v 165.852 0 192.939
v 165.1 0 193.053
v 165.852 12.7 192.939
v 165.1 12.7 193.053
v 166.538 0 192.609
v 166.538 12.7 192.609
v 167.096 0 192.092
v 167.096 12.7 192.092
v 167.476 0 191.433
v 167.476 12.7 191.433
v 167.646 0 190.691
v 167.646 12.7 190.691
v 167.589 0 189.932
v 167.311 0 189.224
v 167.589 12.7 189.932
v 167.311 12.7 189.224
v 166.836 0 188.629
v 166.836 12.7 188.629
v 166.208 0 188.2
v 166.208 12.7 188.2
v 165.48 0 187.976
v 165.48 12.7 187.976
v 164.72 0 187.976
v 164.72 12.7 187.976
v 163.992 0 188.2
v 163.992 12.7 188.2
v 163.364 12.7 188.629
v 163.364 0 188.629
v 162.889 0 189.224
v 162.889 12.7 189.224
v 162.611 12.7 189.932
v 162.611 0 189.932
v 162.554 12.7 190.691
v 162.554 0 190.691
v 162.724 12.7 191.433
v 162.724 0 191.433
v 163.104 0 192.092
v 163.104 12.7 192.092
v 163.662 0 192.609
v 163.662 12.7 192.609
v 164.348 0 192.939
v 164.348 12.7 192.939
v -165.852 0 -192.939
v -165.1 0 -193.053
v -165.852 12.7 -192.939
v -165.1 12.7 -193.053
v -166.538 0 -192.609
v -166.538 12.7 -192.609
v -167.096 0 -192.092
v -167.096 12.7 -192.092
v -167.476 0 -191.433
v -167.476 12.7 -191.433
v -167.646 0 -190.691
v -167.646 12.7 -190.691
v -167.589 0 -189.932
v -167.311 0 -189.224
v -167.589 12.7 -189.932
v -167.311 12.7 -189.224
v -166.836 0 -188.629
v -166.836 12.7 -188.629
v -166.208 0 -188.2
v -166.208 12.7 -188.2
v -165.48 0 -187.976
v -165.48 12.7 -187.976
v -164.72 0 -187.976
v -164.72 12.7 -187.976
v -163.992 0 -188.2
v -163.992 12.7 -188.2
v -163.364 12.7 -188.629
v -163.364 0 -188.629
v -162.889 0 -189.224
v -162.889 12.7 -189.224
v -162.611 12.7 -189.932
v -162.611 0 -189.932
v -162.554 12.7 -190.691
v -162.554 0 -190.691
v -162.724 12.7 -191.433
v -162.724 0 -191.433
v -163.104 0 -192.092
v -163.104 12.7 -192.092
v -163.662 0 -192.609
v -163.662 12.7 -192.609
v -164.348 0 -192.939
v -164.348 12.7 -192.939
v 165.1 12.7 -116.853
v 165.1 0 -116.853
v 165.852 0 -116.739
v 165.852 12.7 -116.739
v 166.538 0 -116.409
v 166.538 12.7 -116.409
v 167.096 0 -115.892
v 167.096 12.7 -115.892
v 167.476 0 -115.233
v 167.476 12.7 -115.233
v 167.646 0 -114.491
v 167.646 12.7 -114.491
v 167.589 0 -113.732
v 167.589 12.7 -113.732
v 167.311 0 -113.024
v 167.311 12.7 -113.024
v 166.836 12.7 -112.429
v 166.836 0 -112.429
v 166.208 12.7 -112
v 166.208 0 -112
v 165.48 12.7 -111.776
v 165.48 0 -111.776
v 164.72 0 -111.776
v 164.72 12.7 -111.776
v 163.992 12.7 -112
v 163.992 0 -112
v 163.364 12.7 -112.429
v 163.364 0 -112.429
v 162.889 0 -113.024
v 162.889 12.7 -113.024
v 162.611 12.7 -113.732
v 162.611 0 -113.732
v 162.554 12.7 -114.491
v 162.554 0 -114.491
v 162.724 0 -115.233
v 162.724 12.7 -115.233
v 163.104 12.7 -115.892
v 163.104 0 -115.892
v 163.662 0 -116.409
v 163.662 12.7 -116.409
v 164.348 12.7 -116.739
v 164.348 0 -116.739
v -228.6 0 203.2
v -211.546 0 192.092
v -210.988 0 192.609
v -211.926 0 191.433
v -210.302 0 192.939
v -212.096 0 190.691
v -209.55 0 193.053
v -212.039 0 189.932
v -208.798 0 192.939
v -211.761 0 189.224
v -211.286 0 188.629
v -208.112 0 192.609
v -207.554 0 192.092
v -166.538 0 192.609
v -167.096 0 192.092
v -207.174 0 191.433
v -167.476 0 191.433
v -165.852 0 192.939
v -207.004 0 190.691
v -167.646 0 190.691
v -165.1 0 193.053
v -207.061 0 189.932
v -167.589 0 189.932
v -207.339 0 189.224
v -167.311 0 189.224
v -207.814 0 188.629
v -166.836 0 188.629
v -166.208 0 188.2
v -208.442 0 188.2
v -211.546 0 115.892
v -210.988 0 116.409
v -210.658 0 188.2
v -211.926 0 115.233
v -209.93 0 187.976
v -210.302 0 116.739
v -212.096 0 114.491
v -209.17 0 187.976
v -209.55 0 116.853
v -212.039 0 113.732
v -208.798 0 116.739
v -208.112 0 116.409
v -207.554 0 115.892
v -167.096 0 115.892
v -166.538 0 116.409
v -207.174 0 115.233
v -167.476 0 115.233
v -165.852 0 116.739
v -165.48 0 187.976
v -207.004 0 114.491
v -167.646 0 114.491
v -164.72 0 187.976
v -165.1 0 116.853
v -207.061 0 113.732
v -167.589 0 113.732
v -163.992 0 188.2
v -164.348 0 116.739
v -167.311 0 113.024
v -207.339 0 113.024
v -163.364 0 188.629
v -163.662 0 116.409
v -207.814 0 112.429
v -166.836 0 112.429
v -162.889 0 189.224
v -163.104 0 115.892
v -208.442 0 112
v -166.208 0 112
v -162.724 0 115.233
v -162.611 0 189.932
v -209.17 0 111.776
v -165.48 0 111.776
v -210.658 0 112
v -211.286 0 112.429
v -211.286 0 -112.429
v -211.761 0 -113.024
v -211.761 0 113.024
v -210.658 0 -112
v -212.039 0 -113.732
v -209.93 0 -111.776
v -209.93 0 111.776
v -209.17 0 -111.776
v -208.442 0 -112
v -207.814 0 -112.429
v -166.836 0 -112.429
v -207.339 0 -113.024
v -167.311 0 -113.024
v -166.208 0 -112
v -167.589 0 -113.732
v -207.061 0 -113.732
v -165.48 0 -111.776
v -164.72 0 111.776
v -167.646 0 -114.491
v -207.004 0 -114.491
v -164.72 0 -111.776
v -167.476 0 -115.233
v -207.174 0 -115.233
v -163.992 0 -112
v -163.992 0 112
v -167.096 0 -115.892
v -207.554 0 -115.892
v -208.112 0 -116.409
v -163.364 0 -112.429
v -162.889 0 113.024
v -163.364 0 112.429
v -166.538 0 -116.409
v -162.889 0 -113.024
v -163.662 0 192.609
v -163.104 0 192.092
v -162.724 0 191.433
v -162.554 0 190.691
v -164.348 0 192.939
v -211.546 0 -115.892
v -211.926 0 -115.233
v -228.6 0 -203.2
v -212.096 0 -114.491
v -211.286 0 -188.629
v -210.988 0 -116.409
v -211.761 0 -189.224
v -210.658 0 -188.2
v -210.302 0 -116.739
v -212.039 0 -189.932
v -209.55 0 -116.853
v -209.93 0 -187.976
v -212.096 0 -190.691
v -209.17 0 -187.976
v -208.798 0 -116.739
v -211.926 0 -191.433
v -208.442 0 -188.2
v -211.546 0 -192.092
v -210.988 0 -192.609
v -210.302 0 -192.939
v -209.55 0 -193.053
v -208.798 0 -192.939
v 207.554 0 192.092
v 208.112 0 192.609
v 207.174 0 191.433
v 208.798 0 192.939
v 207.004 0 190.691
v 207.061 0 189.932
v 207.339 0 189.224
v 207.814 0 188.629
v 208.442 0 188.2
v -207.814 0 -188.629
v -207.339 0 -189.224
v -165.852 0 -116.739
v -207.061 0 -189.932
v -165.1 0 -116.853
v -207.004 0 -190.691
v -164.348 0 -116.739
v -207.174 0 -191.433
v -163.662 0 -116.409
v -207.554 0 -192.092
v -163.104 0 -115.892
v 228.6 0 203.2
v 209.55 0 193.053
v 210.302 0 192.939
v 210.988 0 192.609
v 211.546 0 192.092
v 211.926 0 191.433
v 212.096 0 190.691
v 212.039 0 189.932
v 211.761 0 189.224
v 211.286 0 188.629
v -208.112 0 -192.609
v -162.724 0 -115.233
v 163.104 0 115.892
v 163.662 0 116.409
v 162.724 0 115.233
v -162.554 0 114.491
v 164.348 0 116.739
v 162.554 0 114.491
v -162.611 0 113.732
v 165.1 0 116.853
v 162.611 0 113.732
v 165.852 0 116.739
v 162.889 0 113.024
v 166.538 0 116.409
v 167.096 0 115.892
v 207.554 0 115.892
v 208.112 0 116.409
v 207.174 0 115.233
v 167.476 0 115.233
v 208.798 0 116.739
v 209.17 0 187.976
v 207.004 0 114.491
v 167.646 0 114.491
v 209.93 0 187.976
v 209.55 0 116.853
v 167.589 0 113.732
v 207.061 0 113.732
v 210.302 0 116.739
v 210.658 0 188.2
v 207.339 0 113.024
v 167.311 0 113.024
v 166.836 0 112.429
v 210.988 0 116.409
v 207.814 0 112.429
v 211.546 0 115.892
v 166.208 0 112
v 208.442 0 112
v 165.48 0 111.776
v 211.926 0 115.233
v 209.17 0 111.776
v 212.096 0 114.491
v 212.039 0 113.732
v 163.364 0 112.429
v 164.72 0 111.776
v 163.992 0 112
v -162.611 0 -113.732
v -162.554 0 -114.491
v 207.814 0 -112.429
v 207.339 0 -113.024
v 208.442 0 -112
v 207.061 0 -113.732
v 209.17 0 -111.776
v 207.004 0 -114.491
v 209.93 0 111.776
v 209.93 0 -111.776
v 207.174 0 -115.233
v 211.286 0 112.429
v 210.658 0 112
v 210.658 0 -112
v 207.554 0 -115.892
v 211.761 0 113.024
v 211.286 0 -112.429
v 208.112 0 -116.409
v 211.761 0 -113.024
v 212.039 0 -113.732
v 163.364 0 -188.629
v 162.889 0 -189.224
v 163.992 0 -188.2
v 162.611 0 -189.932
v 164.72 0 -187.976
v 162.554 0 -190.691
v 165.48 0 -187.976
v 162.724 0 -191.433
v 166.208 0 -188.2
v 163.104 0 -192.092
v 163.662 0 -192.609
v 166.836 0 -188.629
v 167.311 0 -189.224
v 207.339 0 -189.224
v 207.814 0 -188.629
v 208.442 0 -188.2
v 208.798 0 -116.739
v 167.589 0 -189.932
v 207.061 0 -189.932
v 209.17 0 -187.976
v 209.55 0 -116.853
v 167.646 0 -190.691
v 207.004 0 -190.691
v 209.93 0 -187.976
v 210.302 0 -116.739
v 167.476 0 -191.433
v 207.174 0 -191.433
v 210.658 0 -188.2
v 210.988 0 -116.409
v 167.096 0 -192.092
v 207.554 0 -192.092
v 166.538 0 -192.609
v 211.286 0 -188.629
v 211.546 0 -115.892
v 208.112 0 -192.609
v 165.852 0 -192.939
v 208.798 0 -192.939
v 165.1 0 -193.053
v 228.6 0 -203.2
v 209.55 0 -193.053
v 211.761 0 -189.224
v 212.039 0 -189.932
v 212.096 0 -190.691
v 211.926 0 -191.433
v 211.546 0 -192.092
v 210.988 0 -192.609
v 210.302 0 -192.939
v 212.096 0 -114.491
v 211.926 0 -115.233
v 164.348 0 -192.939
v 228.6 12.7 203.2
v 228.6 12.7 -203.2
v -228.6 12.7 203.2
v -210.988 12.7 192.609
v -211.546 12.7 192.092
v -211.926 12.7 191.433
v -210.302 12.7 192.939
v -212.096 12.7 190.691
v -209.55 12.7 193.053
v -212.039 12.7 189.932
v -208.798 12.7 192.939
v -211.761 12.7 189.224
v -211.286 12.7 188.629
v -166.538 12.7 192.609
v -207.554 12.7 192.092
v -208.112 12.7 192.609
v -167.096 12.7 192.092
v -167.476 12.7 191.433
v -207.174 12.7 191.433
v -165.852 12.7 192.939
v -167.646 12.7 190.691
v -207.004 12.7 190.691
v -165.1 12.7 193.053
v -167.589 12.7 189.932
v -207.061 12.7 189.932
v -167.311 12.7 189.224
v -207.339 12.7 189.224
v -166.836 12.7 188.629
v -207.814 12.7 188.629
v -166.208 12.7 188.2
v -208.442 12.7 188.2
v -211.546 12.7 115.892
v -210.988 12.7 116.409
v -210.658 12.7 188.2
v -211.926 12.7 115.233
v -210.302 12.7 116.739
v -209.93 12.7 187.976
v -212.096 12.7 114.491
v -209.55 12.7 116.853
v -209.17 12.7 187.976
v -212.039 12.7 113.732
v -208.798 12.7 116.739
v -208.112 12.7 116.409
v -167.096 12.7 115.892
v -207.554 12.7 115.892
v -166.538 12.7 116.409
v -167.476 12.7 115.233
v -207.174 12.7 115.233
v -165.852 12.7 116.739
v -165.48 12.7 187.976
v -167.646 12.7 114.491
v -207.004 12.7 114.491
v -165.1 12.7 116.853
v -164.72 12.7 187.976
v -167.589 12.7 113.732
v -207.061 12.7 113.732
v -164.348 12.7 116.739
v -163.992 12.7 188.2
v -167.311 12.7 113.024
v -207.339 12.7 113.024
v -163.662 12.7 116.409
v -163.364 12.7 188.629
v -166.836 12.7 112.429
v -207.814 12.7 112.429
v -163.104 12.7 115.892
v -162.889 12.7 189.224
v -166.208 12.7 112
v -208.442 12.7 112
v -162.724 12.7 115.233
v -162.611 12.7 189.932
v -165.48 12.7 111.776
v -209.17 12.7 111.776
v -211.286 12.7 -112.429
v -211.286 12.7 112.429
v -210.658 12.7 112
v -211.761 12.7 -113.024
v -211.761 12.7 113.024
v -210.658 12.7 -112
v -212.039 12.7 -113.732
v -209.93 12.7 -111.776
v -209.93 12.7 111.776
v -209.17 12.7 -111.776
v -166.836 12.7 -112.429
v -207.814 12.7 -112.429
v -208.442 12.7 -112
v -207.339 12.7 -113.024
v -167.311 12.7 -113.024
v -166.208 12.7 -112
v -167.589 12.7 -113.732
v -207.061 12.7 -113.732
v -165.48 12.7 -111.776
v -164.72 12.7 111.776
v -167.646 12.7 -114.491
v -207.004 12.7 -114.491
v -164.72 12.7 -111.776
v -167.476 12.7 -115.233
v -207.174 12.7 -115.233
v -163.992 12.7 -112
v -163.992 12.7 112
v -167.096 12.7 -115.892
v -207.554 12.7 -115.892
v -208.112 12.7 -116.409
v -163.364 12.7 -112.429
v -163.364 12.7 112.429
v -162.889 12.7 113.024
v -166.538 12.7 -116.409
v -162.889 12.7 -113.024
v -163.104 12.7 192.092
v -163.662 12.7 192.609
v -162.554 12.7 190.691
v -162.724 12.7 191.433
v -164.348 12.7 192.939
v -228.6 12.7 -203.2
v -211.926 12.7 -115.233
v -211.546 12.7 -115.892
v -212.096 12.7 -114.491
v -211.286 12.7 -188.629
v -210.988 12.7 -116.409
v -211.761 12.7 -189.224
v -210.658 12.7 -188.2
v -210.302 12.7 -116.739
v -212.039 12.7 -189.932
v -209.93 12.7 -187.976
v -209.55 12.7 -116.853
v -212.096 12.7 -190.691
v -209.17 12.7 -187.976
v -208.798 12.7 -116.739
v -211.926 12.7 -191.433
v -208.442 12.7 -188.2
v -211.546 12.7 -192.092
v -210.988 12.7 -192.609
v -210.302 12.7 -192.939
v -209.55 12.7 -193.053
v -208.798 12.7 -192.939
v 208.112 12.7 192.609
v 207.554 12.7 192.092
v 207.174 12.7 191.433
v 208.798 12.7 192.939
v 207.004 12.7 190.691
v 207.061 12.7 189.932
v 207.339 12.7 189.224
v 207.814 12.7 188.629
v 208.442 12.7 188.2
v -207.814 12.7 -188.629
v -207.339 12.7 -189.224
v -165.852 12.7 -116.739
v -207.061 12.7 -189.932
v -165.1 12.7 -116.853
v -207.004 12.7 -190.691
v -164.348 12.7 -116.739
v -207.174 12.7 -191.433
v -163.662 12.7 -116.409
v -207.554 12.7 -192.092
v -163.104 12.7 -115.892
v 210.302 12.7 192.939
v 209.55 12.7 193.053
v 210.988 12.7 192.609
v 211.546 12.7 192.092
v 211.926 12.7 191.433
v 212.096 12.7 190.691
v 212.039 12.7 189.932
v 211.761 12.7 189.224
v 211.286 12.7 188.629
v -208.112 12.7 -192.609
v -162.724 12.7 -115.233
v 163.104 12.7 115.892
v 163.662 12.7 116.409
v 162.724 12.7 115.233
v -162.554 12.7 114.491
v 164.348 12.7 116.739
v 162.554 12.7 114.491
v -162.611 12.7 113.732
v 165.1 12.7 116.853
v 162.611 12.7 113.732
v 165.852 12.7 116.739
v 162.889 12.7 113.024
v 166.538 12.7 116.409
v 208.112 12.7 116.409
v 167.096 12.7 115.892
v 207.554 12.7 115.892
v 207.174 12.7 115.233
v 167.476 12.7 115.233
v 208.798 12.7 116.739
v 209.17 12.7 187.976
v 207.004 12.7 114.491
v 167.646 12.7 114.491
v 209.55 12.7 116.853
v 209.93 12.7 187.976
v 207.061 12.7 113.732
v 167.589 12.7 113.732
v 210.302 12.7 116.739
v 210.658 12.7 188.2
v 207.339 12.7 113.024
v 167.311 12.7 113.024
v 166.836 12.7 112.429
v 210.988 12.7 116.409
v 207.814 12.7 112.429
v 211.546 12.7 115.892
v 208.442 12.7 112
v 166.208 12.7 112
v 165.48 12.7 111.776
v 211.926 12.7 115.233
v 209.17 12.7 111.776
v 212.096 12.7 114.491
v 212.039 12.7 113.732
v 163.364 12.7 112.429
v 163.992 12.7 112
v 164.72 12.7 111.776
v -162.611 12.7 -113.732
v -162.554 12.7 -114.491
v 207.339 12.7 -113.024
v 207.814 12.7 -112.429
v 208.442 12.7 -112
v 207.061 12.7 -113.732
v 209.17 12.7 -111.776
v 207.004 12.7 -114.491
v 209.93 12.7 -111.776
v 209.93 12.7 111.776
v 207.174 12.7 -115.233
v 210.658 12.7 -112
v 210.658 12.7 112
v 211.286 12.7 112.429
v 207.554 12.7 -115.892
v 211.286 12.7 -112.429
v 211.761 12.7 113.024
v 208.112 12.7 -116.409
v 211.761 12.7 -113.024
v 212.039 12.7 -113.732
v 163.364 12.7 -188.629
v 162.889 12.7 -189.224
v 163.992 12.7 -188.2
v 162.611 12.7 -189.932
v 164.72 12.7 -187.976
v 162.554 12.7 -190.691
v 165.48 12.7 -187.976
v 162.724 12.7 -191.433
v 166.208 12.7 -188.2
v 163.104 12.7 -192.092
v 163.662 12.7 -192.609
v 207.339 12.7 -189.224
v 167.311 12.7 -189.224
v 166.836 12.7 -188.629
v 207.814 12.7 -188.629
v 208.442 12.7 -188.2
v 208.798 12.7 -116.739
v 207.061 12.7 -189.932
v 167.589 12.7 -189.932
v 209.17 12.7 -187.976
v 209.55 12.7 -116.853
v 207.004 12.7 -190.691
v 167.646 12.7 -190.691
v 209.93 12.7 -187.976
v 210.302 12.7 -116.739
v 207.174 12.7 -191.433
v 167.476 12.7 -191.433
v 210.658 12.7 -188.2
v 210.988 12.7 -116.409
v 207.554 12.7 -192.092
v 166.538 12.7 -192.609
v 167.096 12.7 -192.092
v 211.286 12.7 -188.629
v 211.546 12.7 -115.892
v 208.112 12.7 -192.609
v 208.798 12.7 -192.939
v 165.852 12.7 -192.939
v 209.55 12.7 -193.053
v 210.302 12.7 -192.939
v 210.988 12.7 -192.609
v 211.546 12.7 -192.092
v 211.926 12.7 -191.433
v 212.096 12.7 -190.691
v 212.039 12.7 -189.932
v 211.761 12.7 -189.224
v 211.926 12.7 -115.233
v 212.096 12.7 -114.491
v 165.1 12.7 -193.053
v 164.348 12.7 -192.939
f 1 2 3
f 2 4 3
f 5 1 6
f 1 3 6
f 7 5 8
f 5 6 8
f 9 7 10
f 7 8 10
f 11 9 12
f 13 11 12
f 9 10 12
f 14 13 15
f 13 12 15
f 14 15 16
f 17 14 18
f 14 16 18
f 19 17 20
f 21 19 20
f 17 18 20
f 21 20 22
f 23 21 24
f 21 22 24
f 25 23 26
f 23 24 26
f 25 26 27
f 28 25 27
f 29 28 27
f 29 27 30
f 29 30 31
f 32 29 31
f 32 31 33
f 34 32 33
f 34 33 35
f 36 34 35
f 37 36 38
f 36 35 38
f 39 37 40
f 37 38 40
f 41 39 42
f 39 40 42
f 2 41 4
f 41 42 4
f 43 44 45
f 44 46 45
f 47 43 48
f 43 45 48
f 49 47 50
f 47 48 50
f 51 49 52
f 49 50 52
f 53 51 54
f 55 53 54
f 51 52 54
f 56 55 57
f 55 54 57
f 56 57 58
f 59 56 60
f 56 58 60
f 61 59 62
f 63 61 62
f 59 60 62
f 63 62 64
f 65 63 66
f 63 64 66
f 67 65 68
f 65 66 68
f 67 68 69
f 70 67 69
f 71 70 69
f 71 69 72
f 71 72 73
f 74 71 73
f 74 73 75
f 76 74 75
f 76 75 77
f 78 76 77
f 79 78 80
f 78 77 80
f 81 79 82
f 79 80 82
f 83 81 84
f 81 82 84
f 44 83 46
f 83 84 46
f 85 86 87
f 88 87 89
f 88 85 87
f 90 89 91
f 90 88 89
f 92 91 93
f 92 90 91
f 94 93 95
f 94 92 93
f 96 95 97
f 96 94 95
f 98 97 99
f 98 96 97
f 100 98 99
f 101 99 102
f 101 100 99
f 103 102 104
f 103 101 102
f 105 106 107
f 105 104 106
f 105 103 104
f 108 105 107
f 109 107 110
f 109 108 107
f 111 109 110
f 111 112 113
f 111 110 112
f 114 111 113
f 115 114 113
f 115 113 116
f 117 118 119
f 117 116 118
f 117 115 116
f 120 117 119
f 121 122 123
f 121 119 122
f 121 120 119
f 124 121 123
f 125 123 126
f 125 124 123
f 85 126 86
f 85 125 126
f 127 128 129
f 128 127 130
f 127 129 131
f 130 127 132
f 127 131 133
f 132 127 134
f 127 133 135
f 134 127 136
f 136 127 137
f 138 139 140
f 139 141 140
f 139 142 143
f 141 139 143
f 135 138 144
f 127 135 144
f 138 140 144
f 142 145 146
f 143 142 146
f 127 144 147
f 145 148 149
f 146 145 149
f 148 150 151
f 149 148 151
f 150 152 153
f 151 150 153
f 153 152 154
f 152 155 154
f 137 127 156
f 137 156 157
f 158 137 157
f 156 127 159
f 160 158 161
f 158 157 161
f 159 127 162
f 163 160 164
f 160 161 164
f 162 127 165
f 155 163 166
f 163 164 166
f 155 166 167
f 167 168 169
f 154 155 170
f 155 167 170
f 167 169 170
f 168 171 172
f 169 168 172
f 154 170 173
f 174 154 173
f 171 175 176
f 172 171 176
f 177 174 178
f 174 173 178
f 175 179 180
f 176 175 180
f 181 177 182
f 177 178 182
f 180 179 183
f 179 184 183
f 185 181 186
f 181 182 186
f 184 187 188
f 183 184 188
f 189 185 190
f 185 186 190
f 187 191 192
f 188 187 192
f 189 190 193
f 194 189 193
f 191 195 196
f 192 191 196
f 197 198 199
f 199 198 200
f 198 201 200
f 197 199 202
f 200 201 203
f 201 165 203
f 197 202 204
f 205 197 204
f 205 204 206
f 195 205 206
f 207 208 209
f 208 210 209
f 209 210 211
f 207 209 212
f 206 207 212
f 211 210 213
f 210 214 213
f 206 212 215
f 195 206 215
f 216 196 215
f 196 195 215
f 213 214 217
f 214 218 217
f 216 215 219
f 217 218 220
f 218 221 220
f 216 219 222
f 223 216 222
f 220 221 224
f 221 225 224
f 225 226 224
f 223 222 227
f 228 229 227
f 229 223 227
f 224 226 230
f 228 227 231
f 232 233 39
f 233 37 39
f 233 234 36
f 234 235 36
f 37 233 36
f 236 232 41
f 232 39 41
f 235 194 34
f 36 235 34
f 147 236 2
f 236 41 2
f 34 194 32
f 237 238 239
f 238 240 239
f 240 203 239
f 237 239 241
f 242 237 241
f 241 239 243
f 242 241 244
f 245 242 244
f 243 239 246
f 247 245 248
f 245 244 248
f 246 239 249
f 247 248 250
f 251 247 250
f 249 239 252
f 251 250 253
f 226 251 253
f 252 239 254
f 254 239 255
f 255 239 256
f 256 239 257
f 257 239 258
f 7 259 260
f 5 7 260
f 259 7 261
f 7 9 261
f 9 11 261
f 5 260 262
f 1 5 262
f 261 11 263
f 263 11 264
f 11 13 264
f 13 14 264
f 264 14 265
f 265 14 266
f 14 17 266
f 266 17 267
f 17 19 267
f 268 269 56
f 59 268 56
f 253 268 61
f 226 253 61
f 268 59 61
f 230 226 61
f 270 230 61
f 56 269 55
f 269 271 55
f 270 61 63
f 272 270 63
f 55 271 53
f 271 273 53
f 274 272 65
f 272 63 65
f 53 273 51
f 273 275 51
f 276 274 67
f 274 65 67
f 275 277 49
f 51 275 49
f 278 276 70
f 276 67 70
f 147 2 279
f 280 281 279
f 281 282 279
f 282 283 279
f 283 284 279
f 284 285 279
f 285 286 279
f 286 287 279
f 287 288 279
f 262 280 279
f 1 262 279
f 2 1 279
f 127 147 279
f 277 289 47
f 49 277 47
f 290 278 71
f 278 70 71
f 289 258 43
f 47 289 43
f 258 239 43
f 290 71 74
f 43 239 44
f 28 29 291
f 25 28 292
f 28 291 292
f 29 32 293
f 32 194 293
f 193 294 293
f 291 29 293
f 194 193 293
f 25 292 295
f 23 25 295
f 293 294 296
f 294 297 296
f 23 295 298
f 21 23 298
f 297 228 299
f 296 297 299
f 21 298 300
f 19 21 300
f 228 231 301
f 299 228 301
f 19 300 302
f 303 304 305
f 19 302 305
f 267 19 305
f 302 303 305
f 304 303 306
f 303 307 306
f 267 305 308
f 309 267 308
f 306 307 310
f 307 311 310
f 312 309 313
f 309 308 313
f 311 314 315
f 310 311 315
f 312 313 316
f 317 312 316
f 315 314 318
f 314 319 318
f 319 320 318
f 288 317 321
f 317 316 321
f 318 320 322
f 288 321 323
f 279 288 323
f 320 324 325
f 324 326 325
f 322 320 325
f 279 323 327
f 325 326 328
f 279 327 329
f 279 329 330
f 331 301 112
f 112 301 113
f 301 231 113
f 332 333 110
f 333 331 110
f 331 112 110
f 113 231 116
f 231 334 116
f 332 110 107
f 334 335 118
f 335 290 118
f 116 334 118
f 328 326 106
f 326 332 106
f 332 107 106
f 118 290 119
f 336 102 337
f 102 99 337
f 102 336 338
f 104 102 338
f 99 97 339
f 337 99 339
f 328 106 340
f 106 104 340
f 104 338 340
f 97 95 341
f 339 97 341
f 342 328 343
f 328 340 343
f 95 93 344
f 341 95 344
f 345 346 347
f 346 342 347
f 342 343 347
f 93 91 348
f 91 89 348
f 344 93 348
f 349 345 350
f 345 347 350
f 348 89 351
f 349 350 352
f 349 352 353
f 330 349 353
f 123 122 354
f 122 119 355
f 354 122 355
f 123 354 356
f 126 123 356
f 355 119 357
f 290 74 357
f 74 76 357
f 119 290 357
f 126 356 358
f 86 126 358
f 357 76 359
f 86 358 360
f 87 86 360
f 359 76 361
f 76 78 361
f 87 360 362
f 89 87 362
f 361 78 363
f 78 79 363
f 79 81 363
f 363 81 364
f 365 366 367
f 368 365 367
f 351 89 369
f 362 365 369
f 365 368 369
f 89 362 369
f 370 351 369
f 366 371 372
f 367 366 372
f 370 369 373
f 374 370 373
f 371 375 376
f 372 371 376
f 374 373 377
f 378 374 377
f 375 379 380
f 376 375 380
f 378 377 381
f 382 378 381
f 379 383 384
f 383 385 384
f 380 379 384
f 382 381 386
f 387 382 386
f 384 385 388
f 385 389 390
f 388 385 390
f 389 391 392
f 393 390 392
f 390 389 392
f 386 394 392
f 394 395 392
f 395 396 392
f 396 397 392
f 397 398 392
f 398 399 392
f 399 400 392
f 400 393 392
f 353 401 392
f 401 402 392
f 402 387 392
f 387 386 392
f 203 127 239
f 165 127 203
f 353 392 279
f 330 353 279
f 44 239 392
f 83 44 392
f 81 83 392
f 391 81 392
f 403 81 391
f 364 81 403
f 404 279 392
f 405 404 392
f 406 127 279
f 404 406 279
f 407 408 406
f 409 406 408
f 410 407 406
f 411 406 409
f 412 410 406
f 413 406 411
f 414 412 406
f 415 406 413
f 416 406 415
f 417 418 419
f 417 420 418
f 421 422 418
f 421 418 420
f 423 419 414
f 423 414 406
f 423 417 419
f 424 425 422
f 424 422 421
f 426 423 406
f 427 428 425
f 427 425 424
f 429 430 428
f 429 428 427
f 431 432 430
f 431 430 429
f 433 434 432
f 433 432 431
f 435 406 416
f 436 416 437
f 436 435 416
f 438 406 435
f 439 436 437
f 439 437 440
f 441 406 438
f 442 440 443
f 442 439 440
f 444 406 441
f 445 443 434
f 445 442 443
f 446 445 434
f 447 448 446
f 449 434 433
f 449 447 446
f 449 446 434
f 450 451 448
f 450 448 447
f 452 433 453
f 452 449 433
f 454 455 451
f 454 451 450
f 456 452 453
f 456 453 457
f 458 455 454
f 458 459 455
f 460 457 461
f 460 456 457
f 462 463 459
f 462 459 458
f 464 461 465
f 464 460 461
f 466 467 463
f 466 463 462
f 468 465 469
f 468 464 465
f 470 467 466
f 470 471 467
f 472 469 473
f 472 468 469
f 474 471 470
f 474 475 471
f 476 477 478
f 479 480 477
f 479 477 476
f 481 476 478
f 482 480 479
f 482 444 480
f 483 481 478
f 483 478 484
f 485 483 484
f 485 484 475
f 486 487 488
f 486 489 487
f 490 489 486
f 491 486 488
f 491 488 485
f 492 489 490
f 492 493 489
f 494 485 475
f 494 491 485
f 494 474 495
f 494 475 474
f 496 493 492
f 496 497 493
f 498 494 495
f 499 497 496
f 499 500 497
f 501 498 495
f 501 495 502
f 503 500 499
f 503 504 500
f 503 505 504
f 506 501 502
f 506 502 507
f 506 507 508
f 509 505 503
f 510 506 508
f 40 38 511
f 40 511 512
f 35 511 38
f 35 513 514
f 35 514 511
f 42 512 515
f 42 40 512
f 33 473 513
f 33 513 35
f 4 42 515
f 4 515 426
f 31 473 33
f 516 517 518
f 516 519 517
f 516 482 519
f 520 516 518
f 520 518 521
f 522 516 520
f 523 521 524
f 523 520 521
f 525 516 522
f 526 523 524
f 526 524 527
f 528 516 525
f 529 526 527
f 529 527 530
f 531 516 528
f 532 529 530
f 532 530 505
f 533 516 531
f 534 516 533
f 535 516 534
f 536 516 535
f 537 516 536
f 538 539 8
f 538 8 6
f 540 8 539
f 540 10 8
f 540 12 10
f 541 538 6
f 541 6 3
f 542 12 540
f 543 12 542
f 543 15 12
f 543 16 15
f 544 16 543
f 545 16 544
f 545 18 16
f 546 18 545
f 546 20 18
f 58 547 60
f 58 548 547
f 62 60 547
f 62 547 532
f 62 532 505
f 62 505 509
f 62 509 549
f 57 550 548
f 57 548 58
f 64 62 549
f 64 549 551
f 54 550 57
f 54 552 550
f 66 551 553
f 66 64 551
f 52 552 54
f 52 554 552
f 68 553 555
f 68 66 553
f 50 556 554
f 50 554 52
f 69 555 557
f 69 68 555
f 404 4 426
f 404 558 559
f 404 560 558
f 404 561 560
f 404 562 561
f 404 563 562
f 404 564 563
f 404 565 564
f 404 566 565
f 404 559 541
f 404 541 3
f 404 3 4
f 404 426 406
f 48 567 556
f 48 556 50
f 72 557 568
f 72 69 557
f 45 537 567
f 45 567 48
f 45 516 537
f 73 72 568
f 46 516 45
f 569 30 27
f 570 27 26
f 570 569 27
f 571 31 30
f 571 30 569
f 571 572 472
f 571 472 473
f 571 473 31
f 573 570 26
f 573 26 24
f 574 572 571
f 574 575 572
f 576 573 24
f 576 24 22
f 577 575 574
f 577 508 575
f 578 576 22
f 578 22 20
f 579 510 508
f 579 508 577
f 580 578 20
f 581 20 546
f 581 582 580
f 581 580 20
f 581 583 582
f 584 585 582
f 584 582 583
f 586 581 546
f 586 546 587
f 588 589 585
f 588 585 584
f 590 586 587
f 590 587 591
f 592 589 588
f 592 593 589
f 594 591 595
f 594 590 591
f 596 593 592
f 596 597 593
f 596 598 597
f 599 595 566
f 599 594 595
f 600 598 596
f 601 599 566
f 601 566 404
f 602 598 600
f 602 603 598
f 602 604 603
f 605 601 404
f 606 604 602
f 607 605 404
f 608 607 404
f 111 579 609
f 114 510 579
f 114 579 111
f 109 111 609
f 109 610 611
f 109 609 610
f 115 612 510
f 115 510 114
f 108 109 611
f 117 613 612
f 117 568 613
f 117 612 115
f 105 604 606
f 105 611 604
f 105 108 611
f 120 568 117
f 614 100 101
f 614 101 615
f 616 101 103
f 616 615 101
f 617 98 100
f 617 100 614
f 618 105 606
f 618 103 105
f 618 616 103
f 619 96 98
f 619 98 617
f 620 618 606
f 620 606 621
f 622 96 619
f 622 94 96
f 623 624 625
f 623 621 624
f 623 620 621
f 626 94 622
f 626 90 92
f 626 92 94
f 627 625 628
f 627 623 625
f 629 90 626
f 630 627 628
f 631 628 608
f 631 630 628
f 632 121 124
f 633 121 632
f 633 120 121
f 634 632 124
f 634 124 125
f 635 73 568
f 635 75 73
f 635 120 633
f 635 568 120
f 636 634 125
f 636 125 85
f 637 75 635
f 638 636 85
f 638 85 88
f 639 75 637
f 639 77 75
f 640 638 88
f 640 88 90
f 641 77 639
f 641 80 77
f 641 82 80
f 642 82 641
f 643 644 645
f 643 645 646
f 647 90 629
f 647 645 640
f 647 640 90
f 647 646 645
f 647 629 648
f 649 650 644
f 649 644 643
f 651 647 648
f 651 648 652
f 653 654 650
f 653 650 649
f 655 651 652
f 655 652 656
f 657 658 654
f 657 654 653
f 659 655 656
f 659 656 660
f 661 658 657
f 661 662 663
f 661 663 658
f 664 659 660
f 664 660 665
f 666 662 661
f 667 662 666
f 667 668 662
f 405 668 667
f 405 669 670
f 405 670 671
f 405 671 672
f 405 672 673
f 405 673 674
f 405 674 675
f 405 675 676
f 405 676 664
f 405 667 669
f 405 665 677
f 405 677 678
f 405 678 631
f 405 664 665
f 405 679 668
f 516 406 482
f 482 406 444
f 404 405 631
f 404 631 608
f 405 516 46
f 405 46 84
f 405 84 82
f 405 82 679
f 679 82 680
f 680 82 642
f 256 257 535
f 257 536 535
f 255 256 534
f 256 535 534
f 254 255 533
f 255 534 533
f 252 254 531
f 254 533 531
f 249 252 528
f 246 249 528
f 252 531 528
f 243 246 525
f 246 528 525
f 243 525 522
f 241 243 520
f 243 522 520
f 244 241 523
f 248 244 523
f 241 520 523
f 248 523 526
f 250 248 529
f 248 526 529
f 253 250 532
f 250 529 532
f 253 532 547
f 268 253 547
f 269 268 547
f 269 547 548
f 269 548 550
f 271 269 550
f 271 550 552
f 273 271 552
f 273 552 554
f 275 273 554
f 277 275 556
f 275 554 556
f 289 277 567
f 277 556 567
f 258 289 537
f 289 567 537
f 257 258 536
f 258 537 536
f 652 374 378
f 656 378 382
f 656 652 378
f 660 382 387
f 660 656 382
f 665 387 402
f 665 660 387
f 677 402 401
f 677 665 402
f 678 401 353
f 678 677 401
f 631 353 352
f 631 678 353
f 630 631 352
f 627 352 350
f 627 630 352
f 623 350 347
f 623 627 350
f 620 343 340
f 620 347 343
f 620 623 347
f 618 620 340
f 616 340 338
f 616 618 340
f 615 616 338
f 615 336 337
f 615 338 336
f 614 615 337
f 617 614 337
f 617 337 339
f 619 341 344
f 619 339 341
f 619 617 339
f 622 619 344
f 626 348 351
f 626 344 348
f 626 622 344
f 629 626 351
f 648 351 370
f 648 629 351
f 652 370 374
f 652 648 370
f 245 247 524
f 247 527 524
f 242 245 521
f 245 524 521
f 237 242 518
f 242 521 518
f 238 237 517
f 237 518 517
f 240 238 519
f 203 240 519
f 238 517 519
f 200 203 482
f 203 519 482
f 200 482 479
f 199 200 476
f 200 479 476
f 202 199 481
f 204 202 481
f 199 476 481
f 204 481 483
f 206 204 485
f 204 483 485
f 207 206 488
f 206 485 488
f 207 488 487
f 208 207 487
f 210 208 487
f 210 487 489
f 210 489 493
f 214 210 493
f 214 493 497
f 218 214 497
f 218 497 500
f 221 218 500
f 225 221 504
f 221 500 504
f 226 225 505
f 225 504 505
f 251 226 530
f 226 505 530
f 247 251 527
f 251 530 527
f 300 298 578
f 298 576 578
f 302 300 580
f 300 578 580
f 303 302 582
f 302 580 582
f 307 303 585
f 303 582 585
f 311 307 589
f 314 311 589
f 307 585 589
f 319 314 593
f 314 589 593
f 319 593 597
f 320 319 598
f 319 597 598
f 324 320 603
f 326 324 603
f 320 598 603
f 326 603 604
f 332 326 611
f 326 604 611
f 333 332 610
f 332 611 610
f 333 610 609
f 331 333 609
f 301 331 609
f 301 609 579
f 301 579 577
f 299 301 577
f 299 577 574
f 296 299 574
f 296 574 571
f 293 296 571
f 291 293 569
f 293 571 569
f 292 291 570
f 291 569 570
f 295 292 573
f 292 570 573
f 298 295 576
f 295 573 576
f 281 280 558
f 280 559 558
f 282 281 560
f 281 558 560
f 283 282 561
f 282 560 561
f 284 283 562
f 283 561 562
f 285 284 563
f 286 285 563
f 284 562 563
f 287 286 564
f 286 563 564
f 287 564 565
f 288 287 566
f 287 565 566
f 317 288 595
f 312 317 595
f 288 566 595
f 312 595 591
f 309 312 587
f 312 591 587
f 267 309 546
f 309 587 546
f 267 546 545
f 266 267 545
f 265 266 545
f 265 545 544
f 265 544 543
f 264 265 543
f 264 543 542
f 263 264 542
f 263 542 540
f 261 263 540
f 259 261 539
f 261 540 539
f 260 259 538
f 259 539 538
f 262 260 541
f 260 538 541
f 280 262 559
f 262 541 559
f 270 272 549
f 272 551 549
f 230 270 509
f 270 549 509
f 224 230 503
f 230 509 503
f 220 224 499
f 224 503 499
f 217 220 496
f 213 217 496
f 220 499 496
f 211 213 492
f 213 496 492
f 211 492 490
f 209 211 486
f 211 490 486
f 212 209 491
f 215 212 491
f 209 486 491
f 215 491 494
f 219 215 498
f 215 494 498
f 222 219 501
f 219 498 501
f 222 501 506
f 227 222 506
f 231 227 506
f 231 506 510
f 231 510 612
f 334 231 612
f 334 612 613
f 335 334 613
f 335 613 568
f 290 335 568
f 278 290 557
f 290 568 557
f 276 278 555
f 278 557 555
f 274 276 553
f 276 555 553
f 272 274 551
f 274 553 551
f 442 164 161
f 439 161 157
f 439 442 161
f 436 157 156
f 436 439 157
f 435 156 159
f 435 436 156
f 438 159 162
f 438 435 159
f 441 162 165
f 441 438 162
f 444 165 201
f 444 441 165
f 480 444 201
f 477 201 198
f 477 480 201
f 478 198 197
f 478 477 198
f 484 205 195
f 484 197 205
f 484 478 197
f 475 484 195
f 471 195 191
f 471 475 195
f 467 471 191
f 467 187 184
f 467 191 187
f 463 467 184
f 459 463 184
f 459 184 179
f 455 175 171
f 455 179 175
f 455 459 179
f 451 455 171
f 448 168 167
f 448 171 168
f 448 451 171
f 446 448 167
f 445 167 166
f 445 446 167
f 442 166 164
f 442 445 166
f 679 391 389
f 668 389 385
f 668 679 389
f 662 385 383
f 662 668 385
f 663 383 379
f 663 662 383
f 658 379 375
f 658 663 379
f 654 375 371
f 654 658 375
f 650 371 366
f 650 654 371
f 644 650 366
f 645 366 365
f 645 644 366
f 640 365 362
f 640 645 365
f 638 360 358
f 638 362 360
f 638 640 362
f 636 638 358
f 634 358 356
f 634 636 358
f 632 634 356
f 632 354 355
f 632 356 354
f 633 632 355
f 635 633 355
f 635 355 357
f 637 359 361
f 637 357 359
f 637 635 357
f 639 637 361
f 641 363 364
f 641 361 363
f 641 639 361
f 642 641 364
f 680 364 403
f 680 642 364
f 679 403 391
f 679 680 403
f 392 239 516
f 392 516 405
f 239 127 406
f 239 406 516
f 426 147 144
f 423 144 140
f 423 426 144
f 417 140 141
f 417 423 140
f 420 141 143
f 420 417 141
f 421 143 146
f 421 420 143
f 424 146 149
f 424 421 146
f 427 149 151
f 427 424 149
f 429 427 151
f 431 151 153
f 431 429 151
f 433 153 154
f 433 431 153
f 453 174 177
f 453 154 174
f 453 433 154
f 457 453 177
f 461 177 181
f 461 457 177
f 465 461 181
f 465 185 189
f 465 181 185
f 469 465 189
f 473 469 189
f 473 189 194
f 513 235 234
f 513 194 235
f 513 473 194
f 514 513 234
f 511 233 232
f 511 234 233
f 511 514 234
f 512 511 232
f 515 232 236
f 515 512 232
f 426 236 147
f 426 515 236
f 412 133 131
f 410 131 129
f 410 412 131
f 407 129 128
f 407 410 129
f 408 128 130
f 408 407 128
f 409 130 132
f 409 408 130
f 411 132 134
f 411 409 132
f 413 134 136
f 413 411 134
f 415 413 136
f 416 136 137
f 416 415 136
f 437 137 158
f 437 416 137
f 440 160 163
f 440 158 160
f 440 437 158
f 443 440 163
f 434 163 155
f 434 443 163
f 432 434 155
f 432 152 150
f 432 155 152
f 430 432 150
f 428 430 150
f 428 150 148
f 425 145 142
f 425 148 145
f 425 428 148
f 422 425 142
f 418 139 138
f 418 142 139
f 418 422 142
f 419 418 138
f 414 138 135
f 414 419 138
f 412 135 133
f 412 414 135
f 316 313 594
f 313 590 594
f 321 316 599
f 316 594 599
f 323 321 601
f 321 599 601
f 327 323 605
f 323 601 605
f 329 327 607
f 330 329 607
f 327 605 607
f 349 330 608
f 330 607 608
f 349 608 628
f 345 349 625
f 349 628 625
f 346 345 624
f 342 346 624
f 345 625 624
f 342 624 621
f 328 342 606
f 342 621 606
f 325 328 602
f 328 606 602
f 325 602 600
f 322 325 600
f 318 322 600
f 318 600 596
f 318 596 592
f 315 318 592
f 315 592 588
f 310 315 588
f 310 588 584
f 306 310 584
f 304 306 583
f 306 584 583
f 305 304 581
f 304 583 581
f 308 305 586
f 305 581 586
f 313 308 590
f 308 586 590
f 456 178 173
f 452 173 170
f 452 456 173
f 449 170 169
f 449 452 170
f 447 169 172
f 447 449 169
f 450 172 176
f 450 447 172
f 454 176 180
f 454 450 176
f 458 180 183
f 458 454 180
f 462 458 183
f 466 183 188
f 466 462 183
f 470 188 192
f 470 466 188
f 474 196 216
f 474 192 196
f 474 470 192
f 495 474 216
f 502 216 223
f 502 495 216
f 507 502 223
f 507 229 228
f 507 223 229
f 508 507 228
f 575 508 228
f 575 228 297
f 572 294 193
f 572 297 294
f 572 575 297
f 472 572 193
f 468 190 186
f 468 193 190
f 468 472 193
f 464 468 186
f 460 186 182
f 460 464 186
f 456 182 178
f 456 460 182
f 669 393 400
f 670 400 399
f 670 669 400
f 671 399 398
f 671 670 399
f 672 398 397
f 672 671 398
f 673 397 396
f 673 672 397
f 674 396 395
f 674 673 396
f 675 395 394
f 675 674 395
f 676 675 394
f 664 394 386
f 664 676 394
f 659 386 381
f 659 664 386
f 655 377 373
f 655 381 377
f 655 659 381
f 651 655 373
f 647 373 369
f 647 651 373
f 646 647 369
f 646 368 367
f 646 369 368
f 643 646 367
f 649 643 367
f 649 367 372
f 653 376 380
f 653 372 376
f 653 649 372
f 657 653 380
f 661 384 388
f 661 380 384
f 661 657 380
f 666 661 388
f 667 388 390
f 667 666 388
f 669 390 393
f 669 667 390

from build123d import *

# Parameters (mm, degrees)
SKETCH1_W                        = 457.2
SKETCH1_H                        = 406.4
BOSS_EXTRUDE1_DEPTH              = 12.7
F_1_4_20_TAPPED_HOLE1_AT_2_COUNT = 2
F_1_4_20_TAPPED_HOLE1_AT_2_PITCH = 76.2
F_1_4_20_TAPPED_HOLE1_AT_3_COUNT = 2
F_1_4_20_TAPPED_HOLE1_AT_3_PITCH = 88.217019333
F_1_4_20_TAPPED_HOLE1_AT_4_COUNT = 2
F_1_4_20_TAPPED_HOLE1_AT_4_PITCH = 44.45


with BuildPart() as part:
    # Sketch1 → Boss-Extrude1 (new body)
    with BuildSketch(Plane(origin=(0, 0, 0), x_dir=(1, 0, 0), z_dir=(0, 1, 0))):
        Rectangle(SKETCH1_W, SKETCH1_H)
    extrude(amount=BOSS_EXTRUDE1_DEPTH)

    # Sketch4 → 1/4-20 Tapped Hole1 (revolve, cut)
    with BuildSketch(Plane(origin=(-209.55, 12.7, 190.5), x_dir=(0, 0, 1), z_dir=(1, 0, 0))):
        Polygon((0, 0), (0, 18.043816902), (2.5527, 16.51), (2.5527, 0), align=None)
    f_1_4_20_tapped_hole1 = revolve(axis=Axis((-209.55, 19.05, 190.5), (0, -1, 0)), mode=Mode.SUBTRACT)

    # 1/4-20 Tapped Hole1 at 2: 1/4-20 Tapped Hole1 ×2
    with Locations(*[(0, 0, -i * F_1_4_20_TAPPED_HOLE1_AT_2_PITCH) for i in range(1, F_1_4_20_TAPPED_HOLE1_AT_2_COUNT)]):
        add(f_1_4_20_tapped_hole1, mode=Mode.SUBTRACT)

    # 1/4-20 Tapped Hole1 at 3: 1/4-20 Tapped Hole1 ×2
    with Locations(*[Vector(0.5038710255240861, 0, -0.8637789008984336) * (i * F_1_4_20_TAPPED_HOLE1_AT_3_PITCH) for i in range(1, F_1_4_20_TAPPED_HOLE1_AT_3_COUNT)]):
        add(f_1_4_20_tapped_hole1, mode=Mode.SUBTRACT)

    # 1/4-20 Tapped Hole1 at 4: 1/4-20 Tapped Hole1 ×2
    with Locations(*[(i * F_1_4_20_TAPPED_HOLE1_AT_4_PITCH, 0, 0) for i in range(1, F_1_4_20_TAPPED_HOLE1_AT_4_COUNT)]):
        add(f_1_4_20_tapped_hole1, mode=Mode.SUBTRACT)

    # Mirror1: 1/4-20 Tapped Hole1 across plane
    add(f_1_4_20_tapped_hole1.mirror(Plane(origin=(0, 0, 0), x_dir=(0, 0, 1), z_dir=(1, 0, 0))), mode=Mode.SUBTRACT)

    # Mirror1 copy 1 sketch → Mirror1 copy 1 (revolve, cut)
    with BuildSketch(Plane(origin=(209.55, 12.7, 114.3), x_dir=(0, 0, 1), z_dir=(-1, 0, 0))):
        Polygon((0, 0), (0, -18.043816902), (2.5527, -16.51), (2.5527, 0), align=None)
    revolve(axis=Axis((209.55, 19.05, 114.3), (0, 1, 0)), mode=Mode.SUBTRACT)

    # Mirror1 copy 2 sketch → Mirror1 copy 2 (revolve, cut)
    with BuildSketch(Plane(origin=(165.1, 12.7, 114.3), x_dir=(0, 0, 1), z_dir=(-1, 0, 0))):
        Polygon((0, 0), (0, -18.043816902), (2.5527, -16.51), (2.5527, 0), align=None)
    revolve(axis=Axis((165.1, 19.05, 114.3), (0, 1, 0)), mode=Mode.SUBTRACT)

    # Mirror1 copy 3 sketch → Mirror1 copy 3 (revolve, cut)
    with BuildSketch(Plane(origin=(165.1, 12.7, 190.5), x_dir=(0, 0, 1), z_dir=(-1, 0, 0))):
        Polygon((0, 0), (0, -18.043816902), (2.5527, -16.51), (2.5527, 0), align=None)
    revolve(axis=Axis((165.1, 19.05, 190.5), (0, 1, 0)), mode=Mode.SUBTRACT)

    # Mirror2: 1/4-20 Tapped Hole1 across plane
    add(f_1_4_20_tapped_hole1.mirror(Plane.XY), mode=Mode.SUBTRACT)

    # Mirror2 copy 1 sketch → Mirror2 copy 1 (revolve, cut)
    with BuildSketch(Plane(origin=(-209.55, 12.7, -114.3), x_dir=(0, 0, -1), z_dir=(1, 0, 0))):
        Polygon((0, 0), (0, -18.043816902), (2.5527, -16.51), (2.5527, 0), align=None)
    revolve(axis=Axis((-209.55, 19.05, -114.3), (0, 1, 0)), mode=Mode.SUBTRACT)

    # Mirror2 copy 2 sketch → Mirror2 copy 2 (revolve, cut)
    with BuildSketch(Plane(origin=(-165.1, 12.7, -114.3), x_dir=(0, 0, -1), z_dir=(1, 0, 0))):
        Polygon((0, 0), (0, -18.043816902), (2.5527, -16.51), (2.5527, 0), align=None)
    revolve(axis=Axis((-165.1, 19.05, -114.3), (0, 1, 0)), mode=Mode.SUBTRACT)

    # Mirror2 copy 3 sketch → Mirror2 copy 3 (revolve, cut)
    with BuildSketch(Plane(origin=(-165.1, 12.7, -190.5), x_dir=(0, 0, -1), z_dir=(1, 0, 0))):
        Polygon((0, 0), (0, -18.043816902), (2.5527, -16.51), (2.5527, 0), align=None)
    revolve(axis=Axis((-165.1, 19.05, -190.5), (0, 1, 0)), mode=Mode.SUBTRACT)

    # Mirror2 copy 4 sketch → Mirror2 copy 4 (revolve, cut)
    with BuildSketch(Plane(origin=(209.55, 12.7, -190.5), x_dir=(0, 0, -1), z_dir=(-1, 0, 0))):
        Polygon((0, 0), (0, 18.043816902), (2.5527, 16.51), (2.5527, 0), align=None)
    revolve(axis=Axis((209.55, 19.05, -190.5), (0, -1, 0)), mode=Mode.SUBTRACT)

    # Mirror2 copy 5 sketch → Mirror2 copy 5 (revolve, cut)
    with BuildSketch(Plane(origin=(209.55, 12.7, -114.3), x_dir=(0, 0, -1), z_dir=(-1, 0, 0))):
        Polygon((0, 0), (0, 18.043816902), (2.5527, 16.51), (2.5527, 0), align=None)
    revolve(axis=Axis((209.55, 19.05, -114.3), (0, -1, 0)), mode=Mode.SUBTRACT)

    # Mirror2 copy 6 sketch → Mirror2 copy 6 (revolve, cut)
    with BuildSketch(Plane(origin=(165.1, 12.7, -114.3), x_dir=(0, 0, -1), z_dir=(-1, 0, 0))):
        Polygon((0, 0), (0, 18.043816902), (2.5527, 16.51), (2.5527, 0), align=None)
    revolve(axis=Axis((165.1, 19.05, -114.3), (0, -1, 0)), mode=Mode.SUBTRACT)

    # Mirror2 copy 7 sketch → Mirror2 copy 7 (revolve, cut)
    with BuildSketch(Plane(origin=(165.1, 12.7, -190.5), x_dir=(0, 0, -1), z_dir=(-1, 0, 0))):
        Polygon((0, 0), (0, 18.043816902), (2.5527, 16.51), (2.5527, 0), align=None)
    revolve(axis=Axis((165.1, 19.05, -190.5), (0, -1, 0)), mode=Mode.SUBTRACT)


solid = part.part
